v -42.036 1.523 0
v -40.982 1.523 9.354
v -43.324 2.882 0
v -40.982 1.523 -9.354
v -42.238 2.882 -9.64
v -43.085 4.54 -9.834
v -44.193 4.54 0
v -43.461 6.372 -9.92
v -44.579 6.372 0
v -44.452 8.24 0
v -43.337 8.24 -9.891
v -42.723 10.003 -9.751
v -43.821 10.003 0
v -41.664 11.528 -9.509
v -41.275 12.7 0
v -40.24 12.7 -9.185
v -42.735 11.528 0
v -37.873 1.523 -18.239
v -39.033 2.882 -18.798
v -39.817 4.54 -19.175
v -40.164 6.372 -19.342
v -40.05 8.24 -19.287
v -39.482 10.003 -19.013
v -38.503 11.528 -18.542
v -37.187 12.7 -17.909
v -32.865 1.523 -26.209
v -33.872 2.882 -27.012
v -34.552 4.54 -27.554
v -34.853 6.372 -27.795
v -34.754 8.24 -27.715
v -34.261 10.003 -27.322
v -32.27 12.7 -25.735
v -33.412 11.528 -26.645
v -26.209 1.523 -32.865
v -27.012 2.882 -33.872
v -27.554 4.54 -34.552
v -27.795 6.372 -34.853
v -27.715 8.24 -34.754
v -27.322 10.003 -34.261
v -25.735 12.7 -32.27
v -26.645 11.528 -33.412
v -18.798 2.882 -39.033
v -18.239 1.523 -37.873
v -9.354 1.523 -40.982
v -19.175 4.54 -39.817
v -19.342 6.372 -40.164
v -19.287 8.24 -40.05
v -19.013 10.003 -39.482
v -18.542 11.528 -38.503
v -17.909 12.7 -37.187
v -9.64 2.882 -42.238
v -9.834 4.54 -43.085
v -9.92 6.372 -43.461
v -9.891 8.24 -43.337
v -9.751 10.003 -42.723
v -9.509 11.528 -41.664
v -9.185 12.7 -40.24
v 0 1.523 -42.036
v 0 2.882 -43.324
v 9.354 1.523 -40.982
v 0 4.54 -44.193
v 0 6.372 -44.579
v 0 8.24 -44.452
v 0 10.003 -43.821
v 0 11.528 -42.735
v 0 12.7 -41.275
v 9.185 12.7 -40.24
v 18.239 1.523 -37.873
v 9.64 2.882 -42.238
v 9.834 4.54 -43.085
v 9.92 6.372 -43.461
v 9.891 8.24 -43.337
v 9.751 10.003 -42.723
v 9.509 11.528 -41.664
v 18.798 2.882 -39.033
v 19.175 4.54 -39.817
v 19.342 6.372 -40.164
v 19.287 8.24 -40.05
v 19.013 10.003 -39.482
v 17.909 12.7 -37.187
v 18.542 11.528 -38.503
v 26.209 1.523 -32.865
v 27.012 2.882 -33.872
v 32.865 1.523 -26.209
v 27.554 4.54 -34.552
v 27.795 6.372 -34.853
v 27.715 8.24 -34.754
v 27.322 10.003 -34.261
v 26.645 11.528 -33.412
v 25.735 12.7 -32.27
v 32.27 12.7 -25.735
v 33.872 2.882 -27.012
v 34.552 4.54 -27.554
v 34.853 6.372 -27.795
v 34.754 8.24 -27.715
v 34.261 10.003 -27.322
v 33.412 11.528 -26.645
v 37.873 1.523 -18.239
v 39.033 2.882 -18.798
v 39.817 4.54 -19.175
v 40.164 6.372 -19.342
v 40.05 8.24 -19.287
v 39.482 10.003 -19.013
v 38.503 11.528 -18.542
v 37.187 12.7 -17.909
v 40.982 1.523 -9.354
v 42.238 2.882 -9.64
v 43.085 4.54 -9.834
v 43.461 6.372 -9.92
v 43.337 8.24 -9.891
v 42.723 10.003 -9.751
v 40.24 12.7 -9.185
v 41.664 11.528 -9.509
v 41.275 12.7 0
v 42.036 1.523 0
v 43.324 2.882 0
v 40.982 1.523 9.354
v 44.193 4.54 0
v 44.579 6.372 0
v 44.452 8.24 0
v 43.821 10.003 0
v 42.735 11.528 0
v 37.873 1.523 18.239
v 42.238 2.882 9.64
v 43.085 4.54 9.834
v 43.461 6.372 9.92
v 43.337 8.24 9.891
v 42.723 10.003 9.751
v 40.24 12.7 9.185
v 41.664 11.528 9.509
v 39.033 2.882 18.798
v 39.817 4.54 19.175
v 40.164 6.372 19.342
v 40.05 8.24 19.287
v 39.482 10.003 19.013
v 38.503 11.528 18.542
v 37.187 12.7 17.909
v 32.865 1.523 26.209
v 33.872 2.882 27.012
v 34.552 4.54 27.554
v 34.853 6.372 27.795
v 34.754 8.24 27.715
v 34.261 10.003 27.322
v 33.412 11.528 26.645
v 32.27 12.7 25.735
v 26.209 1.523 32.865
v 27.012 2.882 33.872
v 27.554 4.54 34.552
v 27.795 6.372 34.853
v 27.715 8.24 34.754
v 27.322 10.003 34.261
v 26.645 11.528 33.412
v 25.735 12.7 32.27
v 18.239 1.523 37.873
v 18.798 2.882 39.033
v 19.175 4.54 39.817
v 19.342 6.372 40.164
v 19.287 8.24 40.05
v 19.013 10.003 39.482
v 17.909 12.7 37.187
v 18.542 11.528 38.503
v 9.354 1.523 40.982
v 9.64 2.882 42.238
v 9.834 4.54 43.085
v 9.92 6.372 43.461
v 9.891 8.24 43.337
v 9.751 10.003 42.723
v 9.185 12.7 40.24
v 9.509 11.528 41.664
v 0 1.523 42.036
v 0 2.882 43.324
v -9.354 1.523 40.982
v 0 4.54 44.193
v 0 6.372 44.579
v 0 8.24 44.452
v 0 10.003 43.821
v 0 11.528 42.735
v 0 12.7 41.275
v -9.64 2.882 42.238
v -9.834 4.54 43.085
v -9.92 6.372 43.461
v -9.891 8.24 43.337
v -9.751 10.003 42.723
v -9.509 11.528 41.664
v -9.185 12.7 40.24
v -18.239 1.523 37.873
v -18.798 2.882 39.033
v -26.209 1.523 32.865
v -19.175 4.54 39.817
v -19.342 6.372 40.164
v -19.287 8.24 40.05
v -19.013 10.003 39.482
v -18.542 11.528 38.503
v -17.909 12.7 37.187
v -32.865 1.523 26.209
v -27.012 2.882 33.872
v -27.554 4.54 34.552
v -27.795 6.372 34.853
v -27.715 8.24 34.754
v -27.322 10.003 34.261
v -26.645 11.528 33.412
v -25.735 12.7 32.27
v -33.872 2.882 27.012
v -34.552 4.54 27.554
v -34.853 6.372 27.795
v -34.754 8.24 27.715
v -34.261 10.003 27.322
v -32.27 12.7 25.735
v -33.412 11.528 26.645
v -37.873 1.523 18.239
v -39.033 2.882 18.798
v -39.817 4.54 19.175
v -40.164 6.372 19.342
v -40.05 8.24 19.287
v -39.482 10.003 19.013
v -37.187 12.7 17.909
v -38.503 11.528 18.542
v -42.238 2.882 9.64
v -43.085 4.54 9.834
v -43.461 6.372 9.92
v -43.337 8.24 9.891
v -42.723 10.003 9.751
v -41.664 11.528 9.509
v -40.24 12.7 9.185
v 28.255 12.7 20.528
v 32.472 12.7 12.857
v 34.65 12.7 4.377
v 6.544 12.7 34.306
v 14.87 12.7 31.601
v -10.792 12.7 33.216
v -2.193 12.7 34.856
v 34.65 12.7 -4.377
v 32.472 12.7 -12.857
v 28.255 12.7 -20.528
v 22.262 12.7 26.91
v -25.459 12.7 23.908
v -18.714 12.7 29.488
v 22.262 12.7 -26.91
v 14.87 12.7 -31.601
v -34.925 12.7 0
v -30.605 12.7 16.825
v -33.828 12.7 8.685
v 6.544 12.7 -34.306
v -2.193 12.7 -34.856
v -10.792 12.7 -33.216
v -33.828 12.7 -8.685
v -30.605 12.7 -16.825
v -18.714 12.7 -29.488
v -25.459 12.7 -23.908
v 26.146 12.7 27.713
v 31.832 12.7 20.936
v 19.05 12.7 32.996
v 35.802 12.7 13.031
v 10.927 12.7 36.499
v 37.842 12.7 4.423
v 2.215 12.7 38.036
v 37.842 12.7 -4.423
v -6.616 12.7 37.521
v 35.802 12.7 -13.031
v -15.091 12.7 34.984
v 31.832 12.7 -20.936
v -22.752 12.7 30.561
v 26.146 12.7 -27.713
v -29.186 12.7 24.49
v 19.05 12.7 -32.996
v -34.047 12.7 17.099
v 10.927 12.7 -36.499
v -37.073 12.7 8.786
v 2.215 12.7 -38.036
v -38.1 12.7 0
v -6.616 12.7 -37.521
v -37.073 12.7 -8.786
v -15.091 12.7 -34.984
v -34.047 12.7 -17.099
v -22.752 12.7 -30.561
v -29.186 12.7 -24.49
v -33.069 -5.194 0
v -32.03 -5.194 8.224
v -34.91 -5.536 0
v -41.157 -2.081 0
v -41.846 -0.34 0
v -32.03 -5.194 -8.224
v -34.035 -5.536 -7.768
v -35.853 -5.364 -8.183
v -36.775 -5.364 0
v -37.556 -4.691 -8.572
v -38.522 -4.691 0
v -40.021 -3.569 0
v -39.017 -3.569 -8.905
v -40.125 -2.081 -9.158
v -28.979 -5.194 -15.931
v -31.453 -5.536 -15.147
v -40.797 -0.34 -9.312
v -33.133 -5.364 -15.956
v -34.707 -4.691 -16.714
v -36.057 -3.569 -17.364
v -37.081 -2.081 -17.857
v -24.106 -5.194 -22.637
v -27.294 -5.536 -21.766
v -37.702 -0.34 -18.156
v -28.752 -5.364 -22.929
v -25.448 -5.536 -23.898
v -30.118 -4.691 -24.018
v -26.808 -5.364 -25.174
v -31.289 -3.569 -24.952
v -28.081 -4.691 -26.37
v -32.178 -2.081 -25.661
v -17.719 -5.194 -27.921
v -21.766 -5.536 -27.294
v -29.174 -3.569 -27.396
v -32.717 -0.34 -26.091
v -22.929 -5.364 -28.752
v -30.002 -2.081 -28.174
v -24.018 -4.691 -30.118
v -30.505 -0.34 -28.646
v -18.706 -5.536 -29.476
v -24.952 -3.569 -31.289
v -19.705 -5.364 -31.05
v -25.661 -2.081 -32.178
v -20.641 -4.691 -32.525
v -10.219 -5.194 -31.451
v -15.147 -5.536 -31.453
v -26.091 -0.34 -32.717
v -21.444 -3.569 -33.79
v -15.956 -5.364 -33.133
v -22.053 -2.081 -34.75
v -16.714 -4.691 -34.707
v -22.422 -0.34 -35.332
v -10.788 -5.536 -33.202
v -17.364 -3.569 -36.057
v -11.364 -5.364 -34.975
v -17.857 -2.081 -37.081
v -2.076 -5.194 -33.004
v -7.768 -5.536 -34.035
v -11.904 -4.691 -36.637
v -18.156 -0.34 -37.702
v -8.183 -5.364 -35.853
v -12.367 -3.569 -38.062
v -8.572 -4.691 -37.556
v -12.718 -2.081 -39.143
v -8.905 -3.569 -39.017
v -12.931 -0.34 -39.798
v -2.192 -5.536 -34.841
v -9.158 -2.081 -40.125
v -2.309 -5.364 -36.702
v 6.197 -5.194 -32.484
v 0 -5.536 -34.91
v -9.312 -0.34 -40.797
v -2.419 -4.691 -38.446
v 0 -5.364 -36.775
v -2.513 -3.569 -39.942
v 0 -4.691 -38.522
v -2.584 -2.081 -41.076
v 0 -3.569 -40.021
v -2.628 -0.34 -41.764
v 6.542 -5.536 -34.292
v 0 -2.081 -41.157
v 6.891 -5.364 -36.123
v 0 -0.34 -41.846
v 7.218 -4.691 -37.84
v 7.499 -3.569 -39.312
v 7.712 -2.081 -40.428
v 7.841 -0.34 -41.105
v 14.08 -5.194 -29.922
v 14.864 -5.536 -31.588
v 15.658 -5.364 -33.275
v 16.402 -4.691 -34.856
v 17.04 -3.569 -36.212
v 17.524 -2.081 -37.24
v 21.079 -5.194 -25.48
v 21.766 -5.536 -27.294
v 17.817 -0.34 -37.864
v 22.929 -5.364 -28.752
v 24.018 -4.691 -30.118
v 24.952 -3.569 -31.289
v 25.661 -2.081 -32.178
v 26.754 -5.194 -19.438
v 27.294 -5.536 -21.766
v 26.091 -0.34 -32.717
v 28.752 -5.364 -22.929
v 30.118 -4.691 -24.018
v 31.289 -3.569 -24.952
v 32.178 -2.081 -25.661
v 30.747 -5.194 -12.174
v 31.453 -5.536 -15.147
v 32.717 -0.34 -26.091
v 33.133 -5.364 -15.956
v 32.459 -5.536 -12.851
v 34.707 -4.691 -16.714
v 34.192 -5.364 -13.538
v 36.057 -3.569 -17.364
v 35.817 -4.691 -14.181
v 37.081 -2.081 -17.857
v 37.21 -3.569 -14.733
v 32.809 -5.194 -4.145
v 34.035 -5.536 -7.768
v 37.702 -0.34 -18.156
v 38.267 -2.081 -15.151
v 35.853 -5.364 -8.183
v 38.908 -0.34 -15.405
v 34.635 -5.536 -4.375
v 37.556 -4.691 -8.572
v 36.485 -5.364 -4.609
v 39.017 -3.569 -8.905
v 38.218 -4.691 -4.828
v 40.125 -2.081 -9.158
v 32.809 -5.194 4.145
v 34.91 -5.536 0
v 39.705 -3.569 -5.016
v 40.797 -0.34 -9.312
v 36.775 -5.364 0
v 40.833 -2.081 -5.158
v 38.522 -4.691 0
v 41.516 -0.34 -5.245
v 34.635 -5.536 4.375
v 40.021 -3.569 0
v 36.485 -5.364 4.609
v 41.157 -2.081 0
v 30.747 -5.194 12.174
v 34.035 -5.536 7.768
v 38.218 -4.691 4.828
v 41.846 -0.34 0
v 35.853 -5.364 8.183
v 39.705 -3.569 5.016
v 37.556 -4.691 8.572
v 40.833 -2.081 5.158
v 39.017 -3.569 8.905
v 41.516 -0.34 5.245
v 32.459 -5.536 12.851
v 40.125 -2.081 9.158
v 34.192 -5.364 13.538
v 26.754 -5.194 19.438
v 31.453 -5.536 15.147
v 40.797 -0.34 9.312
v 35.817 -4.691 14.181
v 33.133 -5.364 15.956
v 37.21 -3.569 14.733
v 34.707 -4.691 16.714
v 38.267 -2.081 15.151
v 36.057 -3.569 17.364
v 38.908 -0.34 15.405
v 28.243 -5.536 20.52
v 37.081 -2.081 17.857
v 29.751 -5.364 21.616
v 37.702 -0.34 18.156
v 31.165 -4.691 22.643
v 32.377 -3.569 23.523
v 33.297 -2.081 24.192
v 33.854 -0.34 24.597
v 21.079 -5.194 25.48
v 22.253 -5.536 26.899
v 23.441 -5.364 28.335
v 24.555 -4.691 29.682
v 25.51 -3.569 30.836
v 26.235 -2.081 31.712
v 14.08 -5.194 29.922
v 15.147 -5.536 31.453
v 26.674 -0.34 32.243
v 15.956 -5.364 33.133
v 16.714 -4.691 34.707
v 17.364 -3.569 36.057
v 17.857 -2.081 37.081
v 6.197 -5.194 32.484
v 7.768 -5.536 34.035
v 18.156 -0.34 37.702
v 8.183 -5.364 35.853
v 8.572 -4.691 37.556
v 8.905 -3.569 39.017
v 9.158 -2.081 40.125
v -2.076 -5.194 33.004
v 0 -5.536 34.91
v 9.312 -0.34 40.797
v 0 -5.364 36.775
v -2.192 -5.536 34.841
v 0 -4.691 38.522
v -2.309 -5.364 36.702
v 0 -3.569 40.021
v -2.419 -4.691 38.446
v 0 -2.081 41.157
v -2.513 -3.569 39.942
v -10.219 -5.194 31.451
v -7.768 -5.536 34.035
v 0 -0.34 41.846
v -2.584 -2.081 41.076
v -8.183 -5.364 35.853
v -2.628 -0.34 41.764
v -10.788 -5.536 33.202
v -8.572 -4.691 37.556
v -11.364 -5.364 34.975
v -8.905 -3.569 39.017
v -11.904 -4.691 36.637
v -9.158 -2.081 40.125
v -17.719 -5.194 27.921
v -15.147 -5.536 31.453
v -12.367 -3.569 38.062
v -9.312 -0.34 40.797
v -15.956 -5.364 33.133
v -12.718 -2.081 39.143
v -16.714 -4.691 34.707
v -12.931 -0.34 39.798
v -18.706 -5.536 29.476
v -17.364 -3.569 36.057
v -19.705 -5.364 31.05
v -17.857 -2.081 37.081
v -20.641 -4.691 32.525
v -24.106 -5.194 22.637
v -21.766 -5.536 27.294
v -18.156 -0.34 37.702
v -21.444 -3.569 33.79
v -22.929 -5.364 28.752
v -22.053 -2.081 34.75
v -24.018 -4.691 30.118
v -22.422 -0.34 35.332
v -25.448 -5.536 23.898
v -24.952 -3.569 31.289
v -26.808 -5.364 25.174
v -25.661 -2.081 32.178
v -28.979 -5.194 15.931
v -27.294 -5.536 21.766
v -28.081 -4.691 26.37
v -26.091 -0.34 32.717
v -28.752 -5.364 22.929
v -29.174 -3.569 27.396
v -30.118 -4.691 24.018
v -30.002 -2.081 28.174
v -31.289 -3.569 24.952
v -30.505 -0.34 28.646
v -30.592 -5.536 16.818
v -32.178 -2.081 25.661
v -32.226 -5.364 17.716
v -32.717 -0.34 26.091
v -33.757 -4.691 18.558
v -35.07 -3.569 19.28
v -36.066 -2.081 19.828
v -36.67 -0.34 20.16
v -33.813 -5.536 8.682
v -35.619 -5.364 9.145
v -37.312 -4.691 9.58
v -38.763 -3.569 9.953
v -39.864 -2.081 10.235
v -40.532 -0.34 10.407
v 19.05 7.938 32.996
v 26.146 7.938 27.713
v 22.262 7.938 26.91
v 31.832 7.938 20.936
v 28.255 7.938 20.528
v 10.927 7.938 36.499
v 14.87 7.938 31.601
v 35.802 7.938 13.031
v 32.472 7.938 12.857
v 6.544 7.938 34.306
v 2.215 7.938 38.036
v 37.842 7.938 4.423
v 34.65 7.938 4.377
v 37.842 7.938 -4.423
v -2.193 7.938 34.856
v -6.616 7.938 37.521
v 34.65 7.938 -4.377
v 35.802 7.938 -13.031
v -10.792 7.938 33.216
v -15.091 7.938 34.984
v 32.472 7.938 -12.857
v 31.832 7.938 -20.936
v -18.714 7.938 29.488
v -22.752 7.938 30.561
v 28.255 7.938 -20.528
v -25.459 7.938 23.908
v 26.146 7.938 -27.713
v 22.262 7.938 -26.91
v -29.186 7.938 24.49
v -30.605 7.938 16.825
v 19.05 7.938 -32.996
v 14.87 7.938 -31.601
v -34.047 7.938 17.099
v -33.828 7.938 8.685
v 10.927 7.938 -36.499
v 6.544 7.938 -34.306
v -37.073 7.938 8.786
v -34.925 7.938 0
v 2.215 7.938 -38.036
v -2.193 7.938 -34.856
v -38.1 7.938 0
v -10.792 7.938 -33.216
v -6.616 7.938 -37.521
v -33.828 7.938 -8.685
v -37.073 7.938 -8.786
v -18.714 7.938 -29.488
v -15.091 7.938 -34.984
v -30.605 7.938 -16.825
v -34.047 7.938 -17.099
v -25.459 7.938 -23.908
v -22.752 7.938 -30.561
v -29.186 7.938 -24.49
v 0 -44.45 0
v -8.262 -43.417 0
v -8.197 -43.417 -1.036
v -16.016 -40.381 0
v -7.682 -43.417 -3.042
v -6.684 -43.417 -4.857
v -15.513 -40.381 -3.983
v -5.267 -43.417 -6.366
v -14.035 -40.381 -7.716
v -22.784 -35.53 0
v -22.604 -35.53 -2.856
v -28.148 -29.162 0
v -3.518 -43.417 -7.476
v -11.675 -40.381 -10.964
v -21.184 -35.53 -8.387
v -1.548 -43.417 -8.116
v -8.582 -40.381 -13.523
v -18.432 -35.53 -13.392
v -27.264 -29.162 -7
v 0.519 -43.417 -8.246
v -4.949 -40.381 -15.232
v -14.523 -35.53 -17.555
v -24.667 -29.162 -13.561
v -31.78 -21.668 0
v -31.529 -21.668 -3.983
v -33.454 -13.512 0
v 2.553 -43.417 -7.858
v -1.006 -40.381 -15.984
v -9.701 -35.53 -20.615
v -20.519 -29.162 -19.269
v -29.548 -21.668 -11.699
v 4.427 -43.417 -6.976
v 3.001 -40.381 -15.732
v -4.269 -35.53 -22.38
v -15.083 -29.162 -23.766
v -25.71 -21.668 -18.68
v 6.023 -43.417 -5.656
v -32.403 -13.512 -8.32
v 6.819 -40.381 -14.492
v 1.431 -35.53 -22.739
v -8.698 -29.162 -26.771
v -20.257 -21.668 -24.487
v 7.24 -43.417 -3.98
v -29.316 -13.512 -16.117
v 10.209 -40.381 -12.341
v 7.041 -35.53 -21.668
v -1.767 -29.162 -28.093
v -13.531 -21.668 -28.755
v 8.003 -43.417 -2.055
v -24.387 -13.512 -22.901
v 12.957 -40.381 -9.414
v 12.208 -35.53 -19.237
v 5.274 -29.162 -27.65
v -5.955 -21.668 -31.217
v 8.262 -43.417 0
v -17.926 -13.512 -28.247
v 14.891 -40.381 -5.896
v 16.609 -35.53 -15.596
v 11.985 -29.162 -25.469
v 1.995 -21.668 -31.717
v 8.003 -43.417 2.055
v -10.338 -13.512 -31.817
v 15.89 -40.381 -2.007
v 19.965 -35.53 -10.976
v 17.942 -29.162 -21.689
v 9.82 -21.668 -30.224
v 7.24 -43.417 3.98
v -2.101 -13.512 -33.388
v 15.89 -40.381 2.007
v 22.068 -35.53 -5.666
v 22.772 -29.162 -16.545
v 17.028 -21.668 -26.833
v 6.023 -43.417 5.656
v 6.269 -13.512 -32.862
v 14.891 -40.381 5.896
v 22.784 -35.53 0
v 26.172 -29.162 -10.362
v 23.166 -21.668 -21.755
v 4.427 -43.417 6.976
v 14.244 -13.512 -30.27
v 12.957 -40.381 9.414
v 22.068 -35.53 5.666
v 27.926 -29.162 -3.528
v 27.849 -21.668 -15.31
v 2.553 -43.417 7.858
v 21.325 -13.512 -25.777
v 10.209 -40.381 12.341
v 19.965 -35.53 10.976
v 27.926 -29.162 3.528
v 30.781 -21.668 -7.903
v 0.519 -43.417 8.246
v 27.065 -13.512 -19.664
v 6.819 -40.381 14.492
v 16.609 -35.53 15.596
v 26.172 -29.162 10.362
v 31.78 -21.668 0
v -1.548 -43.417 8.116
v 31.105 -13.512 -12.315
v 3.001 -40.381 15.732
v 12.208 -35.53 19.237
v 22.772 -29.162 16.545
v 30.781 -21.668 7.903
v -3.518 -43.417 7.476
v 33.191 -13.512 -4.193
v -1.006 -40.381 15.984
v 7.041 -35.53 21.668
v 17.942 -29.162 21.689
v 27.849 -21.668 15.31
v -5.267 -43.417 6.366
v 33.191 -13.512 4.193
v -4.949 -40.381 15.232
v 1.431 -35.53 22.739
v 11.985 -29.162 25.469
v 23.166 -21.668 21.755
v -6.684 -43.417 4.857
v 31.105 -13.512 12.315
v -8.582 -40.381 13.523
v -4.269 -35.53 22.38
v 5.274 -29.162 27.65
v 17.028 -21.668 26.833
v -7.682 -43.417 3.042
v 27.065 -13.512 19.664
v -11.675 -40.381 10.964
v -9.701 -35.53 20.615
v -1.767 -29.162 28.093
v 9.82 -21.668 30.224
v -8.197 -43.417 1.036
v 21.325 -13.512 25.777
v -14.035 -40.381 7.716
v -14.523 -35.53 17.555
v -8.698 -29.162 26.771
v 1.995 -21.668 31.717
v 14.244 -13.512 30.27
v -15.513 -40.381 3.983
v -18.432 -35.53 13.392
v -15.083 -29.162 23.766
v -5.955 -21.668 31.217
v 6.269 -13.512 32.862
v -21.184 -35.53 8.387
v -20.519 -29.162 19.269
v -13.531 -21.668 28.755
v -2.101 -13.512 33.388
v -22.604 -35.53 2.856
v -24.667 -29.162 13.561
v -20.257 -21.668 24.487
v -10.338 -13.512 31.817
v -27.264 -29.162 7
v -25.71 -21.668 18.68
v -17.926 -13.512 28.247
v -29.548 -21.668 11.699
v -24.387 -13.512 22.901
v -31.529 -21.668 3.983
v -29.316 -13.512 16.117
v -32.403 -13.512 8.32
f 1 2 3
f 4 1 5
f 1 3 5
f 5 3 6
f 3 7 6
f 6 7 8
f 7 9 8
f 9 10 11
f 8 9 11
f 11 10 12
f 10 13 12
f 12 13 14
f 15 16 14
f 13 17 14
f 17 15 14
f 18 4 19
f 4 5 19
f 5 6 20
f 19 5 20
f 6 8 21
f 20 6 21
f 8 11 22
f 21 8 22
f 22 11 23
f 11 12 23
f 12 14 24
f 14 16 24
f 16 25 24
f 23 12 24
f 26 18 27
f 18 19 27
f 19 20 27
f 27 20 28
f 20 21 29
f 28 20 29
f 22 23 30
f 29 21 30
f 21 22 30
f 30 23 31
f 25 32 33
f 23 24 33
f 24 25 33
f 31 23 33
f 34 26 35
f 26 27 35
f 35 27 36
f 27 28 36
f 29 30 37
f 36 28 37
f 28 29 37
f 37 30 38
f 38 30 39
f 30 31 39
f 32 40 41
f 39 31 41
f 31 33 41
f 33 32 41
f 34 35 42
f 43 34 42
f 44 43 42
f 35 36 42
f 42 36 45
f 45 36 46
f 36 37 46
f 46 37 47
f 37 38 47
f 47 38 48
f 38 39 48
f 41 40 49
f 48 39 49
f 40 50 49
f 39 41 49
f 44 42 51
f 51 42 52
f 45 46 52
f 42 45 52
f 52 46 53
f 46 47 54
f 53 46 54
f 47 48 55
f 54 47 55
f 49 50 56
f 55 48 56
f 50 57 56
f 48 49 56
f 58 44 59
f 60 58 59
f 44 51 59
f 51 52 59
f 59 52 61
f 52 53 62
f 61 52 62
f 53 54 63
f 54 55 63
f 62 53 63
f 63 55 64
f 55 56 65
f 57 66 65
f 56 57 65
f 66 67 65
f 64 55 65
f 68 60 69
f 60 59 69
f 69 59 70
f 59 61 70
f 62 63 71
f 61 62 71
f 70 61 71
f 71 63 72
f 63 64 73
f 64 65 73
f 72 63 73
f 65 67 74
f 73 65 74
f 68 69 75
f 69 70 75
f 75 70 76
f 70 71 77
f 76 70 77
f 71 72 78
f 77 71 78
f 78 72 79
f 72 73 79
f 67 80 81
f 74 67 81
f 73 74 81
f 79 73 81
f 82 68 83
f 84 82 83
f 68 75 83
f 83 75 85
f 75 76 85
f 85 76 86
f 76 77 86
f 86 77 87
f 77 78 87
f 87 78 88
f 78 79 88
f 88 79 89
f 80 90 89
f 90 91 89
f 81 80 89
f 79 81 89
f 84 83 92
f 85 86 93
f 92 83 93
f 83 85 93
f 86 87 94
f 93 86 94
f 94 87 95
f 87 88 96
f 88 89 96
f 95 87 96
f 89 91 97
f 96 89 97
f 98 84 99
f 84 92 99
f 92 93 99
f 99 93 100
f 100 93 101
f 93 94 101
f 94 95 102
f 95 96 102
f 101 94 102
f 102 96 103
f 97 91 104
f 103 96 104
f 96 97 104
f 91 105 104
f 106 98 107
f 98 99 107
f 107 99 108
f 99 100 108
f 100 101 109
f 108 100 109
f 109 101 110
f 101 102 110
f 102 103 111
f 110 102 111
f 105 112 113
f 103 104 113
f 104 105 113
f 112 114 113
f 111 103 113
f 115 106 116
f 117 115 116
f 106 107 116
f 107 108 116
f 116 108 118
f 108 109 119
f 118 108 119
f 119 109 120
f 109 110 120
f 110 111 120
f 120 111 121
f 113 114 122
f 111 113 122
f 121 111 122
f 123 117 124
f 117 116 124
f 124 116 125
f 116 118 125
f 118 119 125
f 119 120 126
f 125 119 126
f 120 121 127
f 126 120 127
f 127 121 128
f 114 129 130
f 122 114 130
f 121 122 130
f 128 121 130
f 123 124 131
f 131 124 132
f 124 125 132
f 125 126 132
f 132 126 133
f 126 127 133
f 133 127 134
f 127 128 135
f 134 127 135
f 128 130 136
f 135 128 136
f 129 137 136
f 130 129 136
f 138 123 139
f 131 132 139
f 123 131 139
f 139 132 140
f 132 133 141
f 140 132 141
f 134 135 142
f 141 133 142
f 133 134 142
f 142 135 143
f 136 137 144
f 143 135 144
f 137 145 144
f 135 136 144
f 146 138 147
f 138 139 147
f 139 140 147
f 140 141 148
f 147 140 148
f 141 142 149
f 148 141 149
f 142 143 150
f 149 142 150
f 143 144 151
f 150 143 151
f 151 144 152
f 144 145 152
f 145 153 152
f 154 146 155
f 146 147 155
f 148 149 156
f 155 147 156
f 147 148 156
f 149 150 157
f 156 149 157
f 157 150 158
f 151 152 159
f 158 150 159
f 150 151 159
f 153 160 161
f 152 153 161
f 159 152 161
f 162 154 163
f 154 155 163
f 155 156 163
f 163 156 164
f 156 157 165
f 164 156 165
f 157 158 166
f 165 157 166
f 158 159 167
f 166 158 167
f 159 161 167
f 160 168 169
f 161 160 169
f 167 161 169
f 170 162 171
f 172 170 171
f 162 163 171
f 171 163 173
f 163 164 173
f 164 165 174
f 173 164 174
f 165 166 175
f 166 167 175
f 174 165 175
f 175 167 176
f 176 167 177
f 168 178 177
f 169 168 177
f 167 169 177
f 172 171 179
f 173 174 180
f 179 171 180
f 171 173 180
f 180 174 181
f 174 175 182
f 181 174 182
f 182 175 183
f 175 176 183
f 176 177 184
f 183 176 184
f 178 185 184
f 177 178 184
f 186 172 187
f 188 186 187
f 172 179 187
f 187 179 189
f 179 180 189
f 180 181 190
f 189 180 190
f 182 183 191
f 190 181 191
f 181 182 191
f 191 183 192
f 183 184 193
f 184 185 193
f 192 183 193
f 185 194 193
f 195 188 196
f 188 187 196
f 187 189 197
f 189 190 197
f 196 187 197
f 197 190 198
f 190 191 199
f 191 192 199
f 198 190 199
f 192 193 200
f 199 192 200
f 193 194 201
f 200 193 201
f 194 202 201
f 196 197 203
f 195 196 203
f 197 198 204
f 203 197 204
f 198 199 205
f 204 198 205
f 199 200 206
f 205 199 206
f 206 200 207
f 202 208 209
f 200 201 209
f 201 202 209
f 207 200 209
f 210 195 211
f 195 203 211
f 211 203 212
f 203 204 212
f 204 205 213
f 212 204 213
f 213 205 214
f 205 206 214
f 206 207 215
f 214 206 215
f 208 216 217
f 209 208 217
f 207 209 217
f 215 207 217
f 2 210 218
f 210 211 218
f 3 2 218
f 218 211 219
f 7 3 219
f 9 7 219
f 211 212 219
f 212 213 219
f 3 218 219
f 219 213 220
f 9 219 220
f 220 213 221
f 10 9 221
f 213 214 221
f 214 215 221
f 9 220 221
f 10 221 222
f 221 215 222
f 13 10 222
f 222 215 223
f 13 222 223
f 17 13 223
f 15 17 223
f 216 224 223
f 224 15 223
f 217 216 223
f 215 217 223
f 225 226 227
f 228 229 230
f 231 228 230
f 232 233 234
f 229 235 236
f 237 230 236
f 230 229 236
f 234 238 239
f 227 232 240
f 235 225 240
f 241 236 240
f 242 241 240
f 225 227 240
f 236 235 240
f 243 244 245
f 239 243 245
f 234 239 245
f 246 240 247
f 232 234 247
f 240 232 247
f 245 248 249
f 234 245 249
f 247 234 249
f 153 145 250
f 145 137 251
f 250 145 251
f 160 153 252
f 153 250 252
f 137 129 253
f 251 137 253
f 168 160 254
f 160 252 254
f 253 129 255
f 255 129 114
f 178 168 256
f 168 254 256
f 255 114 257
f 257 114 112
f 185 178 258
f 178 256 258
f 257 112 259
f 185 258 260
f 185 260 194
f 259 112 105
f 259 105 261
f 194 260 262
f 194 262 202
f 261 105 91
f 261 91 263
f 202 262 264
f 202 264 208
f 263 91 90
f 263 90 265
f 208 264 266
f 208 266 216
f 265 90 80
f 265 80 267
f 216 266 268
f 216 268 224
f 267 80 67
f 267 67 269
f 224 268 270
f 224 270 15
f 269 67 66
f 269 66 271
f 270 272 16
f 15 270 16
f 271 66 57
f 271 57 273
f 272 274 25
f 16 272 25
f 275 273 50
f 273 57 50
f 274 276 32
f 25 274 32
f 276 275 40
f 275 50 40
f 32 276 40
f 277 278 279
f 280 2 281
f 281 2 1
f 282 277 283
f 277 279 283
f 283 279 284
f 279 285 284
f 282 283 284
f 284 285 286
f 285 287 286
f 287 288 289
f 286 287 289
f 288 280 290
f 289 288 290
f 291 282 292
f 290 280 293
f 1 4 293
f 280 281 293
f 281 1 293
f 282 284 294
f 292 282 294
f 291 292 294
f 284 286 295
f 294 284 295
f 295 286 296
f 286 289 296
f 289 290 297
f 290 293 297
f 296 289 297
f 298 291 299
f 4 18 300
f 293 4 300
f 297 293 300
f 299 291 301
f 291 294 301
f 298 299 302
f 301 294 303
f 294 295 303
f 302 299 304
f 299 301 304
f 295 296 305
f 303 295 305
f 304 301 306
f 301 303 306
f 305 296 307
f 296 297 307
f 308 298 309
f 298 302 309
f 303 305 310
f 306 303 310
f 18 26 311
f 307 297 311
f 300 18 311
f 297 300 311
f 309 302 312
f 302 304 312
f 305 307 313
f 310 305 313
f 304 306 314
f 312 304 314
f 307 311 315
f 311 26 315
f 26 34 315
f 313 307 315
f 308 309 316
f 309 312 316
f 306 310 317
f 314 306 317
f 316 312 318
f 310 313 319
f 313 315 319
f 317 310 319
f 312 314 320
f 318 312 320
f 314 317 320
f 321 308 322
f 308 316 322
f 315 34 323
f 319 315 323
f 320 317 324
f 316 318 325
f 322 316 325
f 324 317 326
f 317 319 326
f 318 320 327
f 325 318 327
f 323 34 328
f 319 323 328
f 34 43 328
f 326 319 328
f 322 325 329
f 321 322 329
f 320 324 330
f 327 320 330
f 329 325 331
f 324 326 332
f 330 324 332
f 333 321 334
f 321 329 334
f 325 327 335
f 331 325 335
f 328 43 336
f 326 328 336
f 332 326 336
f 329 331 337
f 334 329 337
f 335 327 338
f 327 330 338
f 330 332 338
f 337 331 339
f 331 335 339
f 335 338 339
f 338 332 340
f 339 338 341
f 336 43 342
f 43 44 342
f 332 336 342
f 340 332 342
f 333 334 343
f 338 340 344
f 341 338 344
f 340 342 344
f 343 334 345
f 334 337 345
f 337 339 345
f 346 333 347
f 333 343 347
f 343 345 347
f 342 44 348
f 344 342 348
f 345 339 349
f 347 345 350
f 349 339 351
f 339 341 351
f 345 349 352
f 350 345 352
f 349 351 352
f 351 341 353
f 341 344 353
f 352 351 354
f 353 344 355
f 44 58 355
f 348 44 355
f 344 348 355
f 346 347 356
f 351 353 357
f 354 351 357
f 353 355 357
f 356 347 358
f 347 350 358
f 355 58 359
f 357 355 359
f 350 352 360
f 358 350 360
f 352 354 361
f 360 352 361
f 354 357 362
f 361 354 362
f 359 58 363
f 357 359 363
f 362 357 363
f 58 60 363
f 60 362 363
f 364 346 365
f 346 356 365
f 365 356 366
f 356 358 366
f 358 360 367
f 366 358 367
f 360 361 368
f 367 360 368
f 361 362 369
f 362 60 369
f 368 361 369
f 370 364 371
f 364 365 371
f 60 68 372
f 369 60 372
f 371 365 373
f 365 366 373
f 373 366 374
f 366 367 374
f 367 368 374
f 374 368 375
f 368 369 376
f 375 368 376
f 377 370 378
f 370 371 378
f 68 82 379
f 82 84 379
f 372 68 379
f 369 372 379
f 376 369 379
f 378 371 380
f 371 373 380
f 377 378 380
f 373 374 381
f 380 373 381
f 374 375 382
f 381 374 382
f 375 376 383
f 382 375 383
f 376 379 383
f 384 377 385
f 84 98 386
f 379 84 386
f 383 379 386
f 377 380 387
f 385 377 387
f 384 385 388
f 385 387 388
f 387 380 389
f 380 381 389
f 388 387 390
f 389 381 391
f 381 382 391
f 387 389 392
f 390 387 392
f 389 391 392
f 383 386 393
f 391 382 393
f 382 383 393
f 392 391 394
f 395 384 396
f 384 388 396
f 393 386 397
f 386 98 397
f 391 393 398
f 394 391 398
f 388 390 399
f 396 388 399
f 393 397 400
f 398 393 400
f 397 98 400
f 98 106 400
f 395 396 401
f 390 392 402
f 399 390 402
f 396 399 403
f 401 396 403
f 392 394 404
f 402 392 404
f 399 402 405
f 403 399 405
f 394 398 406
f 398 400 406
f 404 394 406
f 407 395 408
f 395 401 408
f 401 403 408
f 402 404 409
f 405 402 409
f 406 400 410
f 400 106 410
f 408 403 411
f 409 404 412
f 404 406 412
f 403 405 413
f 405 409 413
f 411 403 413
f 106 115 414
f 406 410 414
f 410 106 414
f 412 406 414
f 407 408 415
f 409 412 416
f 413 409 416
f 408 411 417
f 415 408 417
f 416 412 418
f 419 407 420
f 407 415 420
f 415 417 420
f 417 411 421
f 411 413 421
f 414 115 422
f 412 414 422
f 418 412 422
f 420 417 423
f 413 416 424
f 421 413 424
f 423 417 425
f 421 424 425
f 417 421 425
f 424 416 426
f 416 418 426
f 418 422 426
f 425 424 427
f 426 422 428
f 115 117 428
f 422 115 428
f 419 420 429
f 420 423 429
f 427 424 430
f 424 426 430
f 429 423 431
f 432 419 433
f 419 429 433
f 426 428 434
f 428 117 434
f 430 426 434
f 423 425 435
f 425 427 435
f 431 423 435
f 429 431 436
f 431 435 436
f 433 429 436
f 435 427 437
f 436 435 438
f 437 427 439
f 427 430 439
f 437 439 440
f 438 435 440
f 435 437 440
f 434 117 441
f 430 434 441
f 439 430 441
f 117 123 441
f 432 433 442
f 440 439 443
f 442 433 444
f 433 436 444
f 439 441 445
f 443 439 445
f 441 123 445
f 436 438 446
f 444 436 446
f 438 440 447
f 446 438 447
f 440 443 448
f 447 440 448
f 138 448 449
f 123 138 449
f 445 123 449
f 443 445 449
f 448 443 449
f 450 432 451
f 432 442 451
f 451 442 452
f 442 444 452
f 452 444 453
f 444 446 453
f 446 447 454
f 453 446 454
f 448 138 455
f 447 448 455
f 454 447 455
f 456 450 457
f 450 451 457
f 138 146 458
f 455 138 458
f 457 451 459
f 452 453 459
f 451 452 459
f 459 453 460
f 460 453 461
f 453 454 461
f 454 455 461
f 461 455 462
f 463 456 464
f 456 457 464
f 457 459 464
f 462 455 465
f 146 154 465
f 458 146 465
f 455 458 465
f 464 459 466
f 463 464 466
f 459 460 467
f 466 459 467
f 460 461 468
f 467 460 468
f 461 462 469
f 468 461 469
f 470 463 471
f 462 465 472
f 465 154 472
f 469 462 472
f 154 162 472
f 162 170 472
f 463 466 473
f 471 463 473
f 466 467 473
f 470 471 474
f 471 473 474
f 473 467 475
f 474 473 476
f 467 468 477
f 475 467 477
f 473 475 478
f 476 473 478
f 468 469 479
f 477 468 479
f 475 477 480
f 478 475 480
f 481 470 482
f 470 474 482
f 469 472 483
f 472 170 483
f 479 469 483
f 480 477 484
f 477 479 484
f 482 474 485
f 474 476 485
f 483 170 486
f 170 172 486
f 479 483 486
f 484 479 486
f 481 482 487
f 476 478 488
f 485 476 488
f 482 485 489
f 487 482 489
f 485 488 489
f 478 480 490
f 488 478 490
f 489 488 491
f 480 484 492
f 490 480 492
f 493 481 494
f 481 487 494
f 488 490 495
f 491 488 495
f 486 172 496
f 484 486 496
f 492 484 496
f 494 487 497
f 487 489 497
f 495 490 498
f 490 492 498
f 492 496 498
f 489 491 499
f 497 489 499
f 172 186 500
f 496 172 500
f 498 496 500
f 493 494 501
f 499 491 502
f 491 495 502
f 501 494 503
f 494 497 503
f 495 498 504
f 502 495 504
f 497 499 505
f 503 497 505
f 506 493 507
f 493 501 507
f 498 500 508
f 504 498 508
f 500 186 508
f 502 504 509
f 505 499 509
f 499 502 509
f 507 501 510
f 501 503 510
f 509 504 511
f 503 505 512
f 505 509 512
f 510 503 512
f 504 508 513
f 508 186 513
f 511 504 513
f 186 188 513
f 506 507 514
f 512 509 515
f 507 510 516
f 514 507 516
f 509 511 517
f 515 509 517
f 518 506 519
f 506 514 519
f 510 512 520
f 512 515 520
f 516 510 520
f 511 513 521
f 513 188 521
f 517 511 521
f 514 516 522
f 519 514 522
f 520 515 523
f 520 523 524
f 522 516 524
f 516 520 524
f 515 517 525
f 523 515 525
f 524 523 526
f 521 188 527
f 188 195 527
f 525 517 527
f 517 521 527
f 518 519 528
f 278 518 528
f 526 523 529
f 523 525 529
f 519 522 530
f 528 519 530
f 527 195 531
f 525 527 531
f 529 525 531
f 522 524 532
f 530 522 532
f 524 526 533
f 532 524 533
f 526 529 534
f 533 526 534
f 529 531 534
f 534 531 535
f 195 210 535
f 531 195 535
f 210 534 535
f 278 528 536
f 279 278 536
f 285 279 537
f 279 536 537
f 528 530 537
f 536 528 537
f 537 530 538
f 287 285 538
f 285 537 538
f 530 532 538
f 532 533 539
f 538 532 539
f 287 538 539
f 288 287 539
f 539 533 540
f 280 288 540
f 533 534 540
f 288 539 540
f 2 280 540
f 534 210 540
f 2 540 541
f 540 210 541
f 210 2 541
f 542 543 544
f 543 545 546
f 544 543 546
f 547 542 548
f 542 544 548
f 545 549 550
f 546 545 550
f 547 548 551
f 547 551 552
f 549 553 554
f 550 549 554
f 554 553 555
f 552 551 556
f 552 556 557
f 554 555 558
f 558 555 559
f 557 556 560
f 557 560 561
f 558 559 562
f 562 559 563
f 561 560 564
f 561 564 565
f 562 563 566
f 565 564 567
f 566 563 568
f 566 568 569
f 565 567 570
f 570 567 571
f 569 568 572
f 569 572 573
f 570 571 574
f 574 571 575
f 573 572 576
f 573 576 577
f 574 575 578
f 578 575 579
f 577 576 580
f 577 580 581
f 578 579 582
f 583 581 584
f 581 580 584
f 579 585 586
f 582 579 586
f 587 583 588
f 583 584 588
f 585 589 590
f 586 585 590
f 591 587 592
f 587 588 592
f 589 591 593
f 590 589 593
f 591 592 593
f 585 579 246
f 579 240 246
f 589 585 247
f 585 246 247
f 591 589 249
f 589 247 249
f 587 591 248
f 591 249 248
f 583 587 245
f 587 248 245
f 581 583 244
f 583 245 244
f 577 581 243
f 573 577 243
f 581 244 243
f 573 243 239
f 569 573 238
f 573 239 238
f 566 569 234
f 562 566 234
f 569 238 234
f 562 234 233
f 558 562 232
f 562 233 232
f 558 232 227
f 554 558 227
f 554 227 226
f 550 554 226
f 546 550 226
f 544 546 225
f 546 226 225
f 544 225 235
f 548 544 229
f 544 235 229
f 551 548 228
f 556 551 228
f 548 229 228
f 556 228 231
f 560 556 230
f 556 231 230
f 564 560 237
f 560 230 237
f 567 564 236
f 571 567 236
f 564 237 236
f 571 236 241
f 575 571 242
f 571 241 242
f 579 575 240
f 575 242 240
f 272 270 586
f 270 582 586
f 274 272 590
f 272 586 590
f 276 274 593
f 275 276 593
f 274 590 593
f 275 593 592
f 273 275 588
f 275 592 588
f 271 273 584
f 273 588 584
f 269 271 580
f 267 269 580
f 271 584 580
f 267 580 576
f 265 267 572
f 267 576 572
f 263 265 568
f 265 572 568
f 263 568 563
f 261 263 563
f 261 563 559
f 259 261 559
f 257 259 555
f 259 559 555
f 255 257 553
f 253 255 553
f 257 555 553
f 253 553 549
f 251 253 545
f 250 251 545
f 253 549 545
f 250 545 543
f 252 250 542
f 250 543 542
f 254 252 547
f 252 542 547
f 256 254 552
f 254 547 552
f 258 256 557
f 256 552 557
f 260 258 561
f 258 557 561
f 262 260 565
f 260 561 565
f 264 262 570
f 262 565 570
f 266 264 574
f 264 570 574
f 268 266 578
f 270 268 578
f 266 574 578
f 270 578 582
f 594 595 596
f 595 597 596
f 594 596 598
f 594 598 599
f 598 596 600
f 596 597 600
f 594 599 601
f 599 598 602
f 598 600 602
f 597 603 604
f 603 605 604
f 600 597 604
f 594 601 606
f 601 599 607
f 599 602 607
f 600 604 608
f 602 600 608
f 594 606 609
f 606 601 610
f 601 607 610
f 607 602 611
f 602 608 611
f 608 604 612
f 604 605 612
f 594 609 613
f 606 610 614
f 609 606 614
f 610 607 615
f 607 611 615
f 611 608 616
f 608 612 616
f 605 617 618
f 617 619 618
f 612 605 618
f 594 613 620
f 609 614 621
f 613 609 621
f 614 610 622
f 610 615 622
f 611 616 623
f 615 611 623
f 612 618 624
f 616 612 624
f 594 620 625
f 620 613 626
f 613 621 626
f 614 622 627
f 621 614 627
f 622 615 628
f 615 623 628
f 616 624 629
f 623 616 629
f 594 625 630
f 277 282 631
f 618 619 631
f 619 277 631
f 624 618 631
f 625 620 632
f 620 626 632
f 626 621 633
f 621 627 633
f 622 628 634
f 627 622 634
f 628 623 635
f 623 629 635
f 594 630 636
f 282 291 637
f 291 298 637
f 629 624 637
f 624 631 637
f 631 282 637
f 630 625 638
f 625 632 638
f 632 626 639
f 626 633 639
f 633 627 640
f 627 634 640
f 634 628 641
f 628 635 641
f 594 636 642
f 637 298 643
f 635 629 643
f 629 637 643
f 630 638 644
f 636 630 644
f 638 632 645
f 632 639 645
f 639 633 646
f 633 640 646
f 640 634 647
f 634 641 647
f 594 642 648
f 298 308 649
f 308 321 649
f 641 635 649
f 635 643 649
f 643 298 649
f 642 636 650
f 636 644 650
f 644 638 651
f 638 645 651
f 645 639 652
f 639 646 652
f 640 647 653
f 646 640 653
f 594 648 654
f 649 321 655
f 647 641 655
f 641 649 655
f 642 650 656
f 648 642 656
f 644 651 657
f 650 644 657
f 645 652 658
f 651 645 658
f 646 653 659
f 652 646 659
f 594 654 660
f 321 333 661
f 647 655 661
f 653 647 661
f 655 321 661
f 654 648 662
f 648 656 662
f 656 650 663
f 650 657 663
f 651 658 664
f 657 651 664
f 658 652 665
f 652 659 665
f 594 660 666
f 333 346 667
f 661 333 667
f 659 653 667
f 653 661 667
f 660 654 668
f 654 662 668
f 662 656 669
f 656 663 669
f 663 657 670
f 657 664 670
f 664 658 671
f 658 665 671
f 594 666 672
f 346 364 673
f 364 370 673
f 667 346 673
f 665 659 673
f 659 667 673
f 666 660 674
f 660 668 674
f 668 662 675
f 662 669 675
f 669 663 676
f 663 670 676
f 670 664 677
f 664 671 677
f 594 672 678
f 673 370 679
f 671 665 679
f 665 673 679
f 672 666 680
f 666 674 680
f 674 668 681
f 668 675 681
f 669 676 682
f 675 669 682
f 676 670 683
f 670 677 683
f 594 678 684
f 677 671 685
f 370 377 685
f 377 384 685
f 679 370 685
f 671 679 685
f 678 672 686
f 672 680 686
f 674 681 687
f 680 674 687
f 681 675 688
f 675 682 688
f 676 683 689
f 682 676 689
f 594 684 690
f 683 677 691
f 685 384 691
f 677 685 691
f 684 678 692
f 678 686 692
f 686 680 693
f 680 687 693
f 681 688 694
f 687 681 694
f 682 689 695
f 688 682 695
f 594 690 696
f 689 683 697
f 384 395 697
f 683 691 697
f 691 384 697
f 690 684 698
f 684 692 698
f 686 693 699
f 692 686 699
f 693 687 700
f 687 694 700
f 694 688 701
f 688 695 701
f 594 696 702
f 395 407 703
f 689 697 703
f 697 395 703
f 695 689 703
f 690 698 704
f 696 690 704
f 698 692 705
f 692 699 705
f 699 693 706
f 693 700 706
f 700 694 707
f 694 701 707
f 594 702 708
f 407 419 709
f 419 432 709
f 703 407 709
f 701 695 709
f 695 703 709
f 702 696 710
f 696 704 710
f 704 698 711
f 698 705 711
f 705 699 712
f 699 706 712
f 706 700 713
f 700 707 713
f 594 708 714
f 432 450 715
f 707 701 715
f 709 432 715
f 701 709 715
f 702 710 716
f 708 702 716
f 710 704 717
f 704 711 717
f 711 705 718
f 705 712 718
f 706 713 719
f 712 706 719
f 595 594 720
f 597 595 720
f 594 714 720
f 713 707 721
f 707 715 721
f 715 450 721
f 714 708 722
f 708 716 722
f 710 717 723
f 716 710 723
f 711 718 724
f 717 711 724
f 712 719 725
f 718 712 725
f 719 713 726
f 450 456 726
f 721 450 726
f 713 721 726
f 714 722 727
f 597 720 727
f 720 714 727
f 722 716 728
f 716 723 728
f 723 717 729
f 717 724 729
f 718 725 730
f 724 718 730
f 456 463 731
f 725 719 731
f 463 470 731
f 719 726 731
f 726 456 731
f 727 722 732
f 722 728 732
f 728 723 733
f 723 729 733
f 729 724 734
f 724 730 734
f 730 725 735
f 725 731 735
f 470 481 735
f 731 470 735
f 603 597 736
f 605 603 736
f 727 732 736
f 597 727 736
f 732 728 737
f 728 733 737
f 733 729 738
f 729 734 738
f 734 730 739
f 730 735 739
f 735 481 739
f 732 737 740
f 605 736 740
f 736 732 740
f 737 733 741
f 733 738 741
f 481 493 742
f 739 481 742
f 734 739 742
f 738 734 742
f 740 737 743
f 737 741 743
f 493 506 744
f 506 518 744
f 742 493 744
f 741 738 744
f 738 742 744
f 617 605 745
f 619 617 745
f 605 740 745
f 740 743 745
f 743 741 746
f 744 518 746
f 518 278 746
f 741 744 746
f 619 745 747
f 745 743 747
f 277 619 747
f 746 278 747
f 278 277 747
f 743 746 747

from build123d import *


with BuildPart() as part:
    # Sketch2 → Revolve1 (revolve)
    with BuildSketch(Plane.XY, mode=Mode.PRIVATE) as revolve1_sk:
        with BuildLine():
            Line((38.1, 7.9375), (34.925, 7.9375))
            Line((34.925, 7.9375), (34.925, 12.7))
            Line((34.925, 12.7), (0, 12.7))
            Line((0, 12.7), (0, 0))
            Line((0, 0), (0, -44.45))
            ThreePointArc((0, -44.45), (25.664225243, -32.512774616), (33.069273235, -5.194006865))
            ThreePointArc((33.069273235, -5.194006865), (39.309985781, -4.181816741), (42.036043974, 1.52253499))
            ThreePointArc((42.036043974, 1.52253499), (44.580012514, 7.310388306), (41.275, 12.7))
            Line((41.275, 12.7), (38.1, 12.7))
            Line((38.1, 12.7), (38.1, 7.9375))
        make_face()
    revolve(revolve1_sk.sketch.rotate(Axis((0, 12.7, 0), (0, -1, 0)), 180), axis=Axis((0, 12.7, 0), (0, -1, 0)))


solid = part.part
